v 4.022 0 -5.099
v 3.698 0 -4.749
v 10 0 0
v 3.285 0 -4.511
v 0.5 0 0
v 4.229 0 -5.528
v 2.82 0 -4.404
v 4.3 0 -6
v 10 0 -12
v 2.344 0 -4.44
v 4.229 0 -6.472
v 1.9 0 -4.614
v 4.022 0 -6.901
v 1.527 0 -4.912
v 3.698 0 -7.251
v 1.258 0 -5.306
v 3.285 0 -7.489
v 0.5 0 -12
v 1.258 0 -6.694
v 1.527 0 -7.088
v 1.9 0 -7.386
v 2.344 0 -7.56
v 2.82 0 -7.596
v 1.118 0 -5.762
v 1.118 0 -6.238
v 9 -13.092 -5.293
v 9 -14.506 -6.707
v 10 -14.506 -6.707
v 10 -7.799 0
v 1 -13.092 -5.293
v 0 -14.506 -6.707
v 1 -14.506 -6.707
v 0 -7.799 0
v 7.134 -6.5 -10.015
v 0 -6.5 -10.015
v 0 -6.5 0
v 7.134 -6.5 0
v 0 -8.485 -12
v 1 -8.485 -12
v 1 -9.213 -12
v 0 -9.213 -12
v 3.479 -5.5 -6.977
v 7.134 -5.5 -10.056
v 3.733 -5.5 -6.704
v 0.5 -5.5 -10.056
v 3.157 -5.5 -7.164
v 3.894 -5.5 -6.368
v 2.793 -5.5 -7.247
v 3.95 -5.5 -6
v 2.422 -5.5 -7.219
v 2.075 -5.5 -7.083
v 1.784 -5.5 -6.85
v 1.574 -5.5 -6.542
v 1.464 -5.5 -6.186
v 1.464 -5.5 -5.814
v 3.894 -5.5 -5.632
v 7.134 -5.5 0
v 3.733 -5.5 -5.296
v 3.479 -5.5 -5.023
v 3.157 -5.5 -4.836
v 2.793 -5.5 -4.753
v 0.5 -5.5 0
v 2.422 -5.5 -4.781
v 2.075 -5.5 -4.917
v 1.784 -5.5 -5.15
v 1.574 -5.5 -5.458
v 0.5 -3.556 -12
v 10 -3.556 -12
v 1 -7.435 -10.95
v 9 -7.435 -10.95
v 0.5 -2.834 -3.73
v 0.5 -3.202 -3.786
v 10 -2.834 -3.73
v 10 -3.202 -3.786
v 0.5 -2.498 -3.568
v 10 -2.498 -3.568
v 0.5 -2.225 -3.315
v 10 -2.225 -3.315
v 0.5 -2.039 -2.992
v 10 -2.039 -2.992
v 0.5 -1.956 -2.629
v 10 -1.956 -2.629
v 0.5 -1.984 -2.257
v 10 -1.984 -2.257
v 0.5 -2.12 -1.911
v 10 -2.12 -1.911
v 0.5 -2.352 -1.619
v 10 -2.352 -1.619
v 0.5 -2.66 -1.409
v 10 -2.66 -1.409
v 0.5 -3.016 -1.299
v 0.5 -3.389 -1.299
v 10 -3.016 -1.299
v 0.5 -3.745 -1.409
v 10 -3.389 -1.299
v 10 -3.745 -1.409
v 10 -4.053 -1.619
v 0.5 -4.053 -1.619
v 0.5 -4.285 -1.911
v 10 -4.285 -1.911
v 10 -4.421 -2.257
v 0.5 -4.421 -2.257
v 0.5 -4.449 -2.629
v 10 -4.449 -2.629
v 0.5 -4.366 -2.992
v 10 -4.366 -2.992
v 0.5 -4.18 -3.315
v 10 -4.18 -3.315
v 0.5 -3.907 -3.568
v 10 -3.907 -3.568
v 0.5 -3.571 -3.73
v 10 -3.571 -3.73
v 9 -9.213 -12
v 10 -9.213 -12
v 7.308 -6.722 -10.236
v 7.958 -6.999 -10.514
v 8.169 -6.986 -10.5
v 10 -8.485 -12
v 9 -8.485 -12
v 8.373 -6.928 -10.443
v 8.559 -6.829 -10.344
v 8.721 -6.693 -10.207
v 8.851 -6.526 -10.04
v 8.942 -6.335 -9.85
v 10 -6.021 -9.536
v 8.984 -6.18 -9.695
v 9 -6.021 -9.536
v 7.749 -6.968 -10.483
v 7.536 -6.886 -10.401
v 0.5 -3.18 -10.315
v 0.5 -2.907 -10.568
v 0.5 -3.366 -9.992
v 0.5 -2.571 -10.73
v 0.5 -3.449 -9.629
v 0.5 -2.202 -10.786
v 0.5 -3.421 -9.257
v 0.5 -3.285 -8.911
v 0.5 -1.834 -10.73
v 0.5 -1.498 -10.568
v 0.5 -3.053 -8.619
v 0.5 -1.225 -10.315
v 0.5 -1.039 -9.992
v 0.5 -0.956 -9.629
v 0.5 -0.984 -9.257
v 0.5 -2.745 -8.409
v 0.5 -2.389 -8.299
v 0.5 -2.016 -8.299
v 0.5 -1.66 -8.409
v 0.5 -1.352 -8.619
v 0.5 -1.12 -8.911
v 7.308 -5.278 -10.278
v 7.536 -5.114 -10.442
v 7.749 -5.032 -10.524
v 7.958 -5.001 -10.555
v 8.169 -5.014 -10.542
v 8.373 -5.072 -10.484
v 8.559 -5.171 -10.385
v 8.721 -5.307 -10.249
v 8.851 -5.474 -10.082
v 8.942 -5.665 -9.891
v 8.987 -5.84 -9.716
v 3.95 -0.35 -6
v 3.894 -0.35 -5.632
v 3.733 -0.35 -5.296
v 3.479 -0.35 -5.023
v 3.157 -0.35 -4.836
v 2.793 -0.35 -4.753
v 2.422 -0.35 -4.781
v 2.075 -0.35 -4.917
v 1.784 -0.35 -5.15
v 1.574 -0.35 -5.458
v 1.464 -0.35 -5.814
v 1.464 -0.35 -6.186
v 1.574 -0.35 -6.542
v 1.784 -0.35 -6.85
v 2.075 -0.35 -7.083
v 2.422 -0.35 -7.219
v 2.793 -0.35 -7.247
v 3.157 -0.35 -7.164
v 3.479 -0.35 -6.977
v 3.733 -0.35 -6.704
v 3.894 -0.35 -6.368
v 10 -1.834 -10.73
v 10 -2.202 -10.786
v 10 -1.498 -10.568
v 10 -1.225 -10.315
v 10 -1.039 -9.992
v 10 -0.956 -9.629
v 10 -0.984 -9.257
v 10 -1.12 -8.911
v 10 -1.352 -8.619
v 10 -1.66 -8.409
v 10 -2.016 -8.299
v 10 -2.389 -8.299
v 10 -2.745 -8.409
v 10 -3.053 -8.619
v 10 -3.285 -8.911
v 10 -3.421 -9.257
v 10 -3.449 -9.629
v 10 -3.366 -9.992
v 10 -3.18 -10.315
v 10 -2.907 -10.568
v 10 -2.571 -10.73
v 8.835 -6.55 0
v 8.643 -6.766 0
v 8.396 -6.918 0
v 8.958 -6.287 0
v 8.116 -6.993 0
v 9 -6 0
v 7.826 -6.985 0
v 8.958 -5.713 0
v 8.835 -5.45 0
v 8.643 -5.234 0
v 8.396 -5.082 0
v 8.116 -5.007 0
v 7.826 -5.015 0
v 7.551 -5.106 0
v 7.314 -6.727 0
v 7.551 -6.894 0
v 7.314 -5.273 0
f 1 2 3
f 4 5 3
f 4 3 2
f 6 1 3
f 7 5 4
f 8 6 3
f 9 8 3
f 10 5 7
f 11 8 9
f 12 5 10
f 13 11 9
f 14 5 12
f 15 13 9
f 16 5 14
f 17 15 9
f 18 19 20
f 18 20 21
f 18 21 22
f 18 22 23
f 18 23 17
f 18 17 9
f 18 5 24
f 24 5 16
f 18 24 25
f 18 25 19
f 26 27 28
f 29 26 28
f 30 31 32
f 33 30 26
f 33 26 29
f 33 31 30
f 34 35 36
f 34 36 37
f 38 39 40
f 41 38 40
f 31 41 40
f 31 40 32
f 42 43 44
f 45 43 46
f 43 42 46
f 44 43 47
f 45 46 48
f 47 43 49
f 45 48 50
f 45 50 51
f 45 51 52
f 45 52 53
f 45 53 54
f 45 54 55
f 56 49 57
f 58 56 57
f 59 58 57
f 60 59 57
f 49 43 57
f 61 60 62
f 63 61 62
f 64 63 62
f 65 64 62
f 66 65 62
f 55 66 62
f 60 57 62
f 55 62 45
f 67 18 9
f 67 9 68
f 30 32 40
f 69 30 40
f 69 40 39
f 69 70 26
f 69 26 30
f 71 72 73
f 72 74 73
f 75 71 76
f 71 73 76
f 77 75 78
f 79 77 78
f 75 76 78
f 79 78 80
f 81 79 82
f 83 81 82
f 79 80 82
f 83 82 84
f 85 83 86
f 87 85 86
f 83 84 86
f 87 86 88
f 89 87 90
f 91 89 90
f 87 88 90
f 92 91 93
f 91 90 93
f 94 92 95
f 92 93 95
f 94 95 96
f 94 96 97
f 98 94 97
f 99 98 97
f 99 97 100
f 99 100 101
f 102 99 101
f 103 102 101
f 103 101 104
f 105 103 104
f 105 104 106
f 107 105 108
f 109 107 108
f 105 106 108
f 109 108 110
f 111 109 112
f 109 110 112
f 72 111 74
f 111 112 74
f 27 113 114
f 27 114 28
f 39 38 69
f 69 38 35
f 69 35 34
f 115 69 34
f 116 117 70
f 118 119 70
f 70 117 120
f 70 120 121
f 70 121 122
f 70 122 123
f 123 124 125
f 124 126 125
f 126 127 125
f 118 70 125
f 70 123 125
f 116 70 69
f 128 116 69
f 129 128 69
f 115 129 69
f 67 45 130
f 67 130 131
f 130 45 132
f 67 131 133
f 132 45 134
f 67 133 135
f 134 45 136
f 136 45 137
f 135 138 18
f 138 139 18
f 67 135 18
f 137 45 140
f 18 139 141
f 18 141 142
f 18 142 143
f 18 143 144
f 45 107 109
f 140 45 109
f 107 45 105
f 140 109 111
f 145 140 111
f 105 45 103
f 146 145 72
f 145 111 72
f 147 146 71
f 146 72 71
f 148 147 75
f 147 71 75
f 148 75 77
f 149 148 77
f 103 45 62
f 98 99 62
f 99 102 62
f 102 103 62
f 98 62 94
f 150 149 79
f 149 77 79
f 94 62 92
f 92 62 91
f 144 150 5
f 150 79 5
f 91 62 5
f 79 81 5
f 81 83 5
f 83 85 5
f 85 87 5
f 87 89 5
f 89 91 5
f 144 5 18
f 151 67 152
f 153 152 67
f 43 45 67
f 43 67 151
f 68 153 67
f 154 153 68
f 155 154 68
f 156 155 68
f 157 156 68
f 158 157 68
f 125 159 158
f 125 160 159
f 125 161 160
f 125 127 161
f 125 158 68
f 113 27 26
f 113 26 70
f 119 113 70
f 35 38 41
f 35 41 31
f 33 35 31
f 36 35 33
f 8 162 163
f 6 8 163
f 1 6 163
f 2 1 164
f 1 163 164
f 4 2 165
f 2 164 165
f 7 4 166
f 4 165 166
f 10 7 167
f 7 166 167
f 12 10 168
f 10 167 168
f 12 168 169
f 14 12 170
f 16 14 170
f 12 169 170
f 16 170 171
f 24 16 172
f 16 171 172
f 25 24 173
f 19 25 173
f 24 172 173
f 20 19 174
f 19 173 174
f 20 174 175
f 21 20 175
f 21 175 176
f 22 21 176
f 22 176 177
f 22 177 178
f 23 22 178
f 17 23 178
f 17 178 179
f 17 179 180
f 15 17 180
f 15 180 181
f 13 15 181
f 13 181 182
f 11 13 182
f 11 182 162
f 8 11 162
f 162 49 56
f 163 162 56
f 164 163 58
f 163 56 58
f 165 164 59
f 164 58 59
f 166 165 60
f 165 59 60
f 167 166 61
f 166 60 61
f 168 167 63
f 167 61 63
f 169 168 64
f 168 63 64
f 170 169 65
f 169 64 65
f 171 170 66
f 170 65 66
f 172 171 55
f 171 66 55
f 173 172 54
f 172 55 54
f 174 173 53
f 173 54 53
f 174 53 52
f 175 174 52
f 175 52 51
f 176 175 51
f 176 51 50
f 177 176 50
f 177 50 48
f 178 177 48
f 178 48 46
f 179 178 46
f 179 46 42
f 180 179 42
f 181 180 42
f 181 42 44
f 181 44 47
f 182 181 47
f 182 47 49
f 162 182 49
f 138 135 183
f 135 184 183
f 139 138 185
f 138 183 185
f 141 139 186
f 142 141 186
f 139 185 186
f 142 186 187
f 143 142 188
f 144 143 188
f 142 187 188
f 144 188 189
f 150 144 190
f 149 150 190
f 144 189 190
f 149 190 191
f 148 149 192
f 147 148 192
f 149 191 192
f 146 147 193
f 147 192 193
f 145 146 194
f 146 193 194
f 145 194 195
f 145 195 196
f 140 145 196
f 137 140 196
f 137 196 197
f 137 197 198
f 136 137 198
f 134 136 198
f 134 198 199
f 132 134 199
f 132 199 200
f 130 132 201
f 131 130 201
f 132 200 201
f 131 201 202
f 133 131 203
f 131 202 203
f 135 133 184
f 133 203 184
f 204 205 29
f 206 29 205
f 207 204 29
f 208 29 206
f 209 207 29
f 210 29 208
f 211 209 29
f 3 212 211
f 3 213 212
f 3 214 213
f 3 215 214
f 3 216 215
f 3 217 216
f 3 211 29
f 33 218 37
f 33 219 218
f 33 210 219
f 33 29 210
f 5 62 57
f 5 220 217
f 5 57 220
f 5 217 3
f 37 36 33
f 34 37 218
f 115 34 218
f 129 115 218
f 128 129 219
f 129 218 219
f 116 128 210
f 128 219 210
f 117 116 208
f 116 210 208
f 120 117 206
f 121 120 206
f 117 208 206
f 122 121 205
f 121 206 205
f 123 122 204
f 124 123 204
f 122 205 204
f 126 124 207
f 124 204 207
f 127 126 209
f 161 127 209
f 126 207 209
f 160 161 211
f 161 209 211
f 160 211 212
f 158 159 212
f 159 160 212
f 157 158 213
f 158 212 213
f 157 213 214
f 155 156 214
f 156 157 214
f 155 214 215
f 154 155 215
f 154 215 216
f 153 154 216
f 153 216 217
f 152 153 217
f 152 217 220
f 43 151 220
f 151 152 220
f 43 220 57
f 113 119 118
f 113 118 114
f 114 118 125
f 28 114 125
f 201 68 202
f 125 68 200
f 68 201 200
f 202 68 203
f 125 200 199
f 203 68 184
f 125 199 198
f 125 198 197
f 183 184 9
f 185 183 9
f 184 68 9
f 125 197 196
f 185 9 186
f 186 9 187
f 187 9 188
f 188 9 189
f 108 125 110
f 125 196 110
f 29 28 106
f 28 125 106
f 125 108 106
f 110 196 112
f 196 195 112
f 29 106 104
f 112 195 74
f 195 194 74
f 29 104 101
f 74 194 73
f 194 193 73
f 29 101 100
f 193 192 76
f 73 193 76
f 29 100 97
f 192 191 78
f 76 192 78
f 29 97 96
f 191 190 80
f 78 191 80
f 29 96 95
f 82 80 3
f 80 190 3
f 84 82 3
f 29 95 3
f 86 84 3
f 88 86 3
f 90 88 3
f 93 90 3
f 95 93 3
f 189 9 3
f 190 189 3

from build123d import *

# Parameters (mm, degrees)
EXTRUDE_1_DEPTH             = 10
SKETCH_2_W                  = 8
SKETCH_2_H                  = 15.737964923
CUT_EXTRUDE_1_DEPTH         = 2
CUT_EXTRUDE_2_DEPTH         = 13
HOLE_WIZARD_M31_D           = 2.5
HOLE_WIZARD_M31_CSINK_D     = 3.3
HOLE_WIZARD_M31_CSINK_ANGLE = 90
HOLE_WIZARD_M32_D           = 2.5
HOLE_WIZARD_M32_DEPTH       = 5.5
HOLE_WIZARD_M32_CSINK_D     = 3.2
HOLE_WIZARD_M32_CSINK_ANGLE = 90
CUT_EXTRUDE_START           = -8
SKETCH_9_W                  = 15.368263211
SKETCH_9_H                  = 5.398005259
CUT_EXTRUDE_3_DEPTH         = 4


with BuildPart() as part:
    # Эскиз1 → Бобышка-Вытянуть1 (new body)
    with BuildSketch(Plane(origin=(0, 0, 0), x_dir=(0, 0, -1), z_dir=(1, 0, 0))):
        Polygon((0, 0), (12, 0), (12, -9.213203436), (6.707106781, -14.506096654), (0, -7.798989873), align=None)
    extrude(amount=EXTRUDE_1_DEPTH)

    # Эскиз2 → Вырез-Вытянуть1 (cut)
    with BuildSketch(Plane(origin=(0, -10.606601718, -10.606601718), x_dir=(-1, 0, 0), z_dir=(0, -0.707106781, -0.707106781))):
        with Locations((-5, -0.262497876)):
            Rectangle(SKETCH_2_W, SKETCH_2_H)
    extrude(amount=-CUT_EXTRUDE_1_DEPTH, mode=Mode.SUBTRACT)

    # Эскиз3 → Вырез-Вытянуть2 (cut, through all)
    with BuildSketch(Plane.XY):
        with BuildLine():
            Line((0.5, -5.5), (0.5, 0))
            Line((0.5, 0), (0, 0))
            Line((0, 0), (0, -6.5))
            Line((0, -6.5), (7.133974596, -6.5))
            ThreePointArc((7.133974596, -6.5), (9, -6), (7.133974596, -5.5))
            Line((7.133974596, -5.5), (0.5, -5.5))
        make_face()
    extrude(amount=-CUT_EXTRUDE_2_DEPTH, mode=Mode.SUBTRACT)

    # Отверстие обработанное метчиком M31 (through all)
    with Locations(Plane.ZY):
        with Locations((-9.535533906, -2.202438662), (-2.535533906, -3.202438662)):
            CounterSinkHole(HOLE_WIZARD_M31_D / 2, HOLE_WIZARD_M31_CSINK_D / 2, counter_sink_angle=HOLE_WIZARD_M31_CSINK_ANGLE)

    # Отверстие обработанное метчиком M32
    with Locations(Plane(origin=(0, 0, 0), x_dir=(-1, 0, 0), z_dir=(0, 1, 0))):
        with Locations((-2.7, -6)):
            CounterSinkHole(HOLE_WIZARD_M32_D / 2, HOLE_WIZARD_M32_CSINK_D / 2, depth=HOLE_WIZARD_M32_DEPTH, counter_sink_angle=HOLE_WIZARD_M32_CSINK_ANGLE)

    # Эскиз9 → Вырез-Вытянуть3 (cut)
    with BuildSketch(Plane(origin=(0, -3.899494937, 3.899494937), x_dir=(1, 0, 0), z_dir=(0, -0.707106781, 0.707106781)).offset(CUT_EXTRUDE_START)):
        with Locations((3.917078905, -13.69900263)):
            Rectangle(SKETCH_9_W, SKETCH_9_H)
    extrude(amount=-CUT_EXTRUDE_3_DEPTH, mode=Mode.SUBTRACT)


solid = part.part
